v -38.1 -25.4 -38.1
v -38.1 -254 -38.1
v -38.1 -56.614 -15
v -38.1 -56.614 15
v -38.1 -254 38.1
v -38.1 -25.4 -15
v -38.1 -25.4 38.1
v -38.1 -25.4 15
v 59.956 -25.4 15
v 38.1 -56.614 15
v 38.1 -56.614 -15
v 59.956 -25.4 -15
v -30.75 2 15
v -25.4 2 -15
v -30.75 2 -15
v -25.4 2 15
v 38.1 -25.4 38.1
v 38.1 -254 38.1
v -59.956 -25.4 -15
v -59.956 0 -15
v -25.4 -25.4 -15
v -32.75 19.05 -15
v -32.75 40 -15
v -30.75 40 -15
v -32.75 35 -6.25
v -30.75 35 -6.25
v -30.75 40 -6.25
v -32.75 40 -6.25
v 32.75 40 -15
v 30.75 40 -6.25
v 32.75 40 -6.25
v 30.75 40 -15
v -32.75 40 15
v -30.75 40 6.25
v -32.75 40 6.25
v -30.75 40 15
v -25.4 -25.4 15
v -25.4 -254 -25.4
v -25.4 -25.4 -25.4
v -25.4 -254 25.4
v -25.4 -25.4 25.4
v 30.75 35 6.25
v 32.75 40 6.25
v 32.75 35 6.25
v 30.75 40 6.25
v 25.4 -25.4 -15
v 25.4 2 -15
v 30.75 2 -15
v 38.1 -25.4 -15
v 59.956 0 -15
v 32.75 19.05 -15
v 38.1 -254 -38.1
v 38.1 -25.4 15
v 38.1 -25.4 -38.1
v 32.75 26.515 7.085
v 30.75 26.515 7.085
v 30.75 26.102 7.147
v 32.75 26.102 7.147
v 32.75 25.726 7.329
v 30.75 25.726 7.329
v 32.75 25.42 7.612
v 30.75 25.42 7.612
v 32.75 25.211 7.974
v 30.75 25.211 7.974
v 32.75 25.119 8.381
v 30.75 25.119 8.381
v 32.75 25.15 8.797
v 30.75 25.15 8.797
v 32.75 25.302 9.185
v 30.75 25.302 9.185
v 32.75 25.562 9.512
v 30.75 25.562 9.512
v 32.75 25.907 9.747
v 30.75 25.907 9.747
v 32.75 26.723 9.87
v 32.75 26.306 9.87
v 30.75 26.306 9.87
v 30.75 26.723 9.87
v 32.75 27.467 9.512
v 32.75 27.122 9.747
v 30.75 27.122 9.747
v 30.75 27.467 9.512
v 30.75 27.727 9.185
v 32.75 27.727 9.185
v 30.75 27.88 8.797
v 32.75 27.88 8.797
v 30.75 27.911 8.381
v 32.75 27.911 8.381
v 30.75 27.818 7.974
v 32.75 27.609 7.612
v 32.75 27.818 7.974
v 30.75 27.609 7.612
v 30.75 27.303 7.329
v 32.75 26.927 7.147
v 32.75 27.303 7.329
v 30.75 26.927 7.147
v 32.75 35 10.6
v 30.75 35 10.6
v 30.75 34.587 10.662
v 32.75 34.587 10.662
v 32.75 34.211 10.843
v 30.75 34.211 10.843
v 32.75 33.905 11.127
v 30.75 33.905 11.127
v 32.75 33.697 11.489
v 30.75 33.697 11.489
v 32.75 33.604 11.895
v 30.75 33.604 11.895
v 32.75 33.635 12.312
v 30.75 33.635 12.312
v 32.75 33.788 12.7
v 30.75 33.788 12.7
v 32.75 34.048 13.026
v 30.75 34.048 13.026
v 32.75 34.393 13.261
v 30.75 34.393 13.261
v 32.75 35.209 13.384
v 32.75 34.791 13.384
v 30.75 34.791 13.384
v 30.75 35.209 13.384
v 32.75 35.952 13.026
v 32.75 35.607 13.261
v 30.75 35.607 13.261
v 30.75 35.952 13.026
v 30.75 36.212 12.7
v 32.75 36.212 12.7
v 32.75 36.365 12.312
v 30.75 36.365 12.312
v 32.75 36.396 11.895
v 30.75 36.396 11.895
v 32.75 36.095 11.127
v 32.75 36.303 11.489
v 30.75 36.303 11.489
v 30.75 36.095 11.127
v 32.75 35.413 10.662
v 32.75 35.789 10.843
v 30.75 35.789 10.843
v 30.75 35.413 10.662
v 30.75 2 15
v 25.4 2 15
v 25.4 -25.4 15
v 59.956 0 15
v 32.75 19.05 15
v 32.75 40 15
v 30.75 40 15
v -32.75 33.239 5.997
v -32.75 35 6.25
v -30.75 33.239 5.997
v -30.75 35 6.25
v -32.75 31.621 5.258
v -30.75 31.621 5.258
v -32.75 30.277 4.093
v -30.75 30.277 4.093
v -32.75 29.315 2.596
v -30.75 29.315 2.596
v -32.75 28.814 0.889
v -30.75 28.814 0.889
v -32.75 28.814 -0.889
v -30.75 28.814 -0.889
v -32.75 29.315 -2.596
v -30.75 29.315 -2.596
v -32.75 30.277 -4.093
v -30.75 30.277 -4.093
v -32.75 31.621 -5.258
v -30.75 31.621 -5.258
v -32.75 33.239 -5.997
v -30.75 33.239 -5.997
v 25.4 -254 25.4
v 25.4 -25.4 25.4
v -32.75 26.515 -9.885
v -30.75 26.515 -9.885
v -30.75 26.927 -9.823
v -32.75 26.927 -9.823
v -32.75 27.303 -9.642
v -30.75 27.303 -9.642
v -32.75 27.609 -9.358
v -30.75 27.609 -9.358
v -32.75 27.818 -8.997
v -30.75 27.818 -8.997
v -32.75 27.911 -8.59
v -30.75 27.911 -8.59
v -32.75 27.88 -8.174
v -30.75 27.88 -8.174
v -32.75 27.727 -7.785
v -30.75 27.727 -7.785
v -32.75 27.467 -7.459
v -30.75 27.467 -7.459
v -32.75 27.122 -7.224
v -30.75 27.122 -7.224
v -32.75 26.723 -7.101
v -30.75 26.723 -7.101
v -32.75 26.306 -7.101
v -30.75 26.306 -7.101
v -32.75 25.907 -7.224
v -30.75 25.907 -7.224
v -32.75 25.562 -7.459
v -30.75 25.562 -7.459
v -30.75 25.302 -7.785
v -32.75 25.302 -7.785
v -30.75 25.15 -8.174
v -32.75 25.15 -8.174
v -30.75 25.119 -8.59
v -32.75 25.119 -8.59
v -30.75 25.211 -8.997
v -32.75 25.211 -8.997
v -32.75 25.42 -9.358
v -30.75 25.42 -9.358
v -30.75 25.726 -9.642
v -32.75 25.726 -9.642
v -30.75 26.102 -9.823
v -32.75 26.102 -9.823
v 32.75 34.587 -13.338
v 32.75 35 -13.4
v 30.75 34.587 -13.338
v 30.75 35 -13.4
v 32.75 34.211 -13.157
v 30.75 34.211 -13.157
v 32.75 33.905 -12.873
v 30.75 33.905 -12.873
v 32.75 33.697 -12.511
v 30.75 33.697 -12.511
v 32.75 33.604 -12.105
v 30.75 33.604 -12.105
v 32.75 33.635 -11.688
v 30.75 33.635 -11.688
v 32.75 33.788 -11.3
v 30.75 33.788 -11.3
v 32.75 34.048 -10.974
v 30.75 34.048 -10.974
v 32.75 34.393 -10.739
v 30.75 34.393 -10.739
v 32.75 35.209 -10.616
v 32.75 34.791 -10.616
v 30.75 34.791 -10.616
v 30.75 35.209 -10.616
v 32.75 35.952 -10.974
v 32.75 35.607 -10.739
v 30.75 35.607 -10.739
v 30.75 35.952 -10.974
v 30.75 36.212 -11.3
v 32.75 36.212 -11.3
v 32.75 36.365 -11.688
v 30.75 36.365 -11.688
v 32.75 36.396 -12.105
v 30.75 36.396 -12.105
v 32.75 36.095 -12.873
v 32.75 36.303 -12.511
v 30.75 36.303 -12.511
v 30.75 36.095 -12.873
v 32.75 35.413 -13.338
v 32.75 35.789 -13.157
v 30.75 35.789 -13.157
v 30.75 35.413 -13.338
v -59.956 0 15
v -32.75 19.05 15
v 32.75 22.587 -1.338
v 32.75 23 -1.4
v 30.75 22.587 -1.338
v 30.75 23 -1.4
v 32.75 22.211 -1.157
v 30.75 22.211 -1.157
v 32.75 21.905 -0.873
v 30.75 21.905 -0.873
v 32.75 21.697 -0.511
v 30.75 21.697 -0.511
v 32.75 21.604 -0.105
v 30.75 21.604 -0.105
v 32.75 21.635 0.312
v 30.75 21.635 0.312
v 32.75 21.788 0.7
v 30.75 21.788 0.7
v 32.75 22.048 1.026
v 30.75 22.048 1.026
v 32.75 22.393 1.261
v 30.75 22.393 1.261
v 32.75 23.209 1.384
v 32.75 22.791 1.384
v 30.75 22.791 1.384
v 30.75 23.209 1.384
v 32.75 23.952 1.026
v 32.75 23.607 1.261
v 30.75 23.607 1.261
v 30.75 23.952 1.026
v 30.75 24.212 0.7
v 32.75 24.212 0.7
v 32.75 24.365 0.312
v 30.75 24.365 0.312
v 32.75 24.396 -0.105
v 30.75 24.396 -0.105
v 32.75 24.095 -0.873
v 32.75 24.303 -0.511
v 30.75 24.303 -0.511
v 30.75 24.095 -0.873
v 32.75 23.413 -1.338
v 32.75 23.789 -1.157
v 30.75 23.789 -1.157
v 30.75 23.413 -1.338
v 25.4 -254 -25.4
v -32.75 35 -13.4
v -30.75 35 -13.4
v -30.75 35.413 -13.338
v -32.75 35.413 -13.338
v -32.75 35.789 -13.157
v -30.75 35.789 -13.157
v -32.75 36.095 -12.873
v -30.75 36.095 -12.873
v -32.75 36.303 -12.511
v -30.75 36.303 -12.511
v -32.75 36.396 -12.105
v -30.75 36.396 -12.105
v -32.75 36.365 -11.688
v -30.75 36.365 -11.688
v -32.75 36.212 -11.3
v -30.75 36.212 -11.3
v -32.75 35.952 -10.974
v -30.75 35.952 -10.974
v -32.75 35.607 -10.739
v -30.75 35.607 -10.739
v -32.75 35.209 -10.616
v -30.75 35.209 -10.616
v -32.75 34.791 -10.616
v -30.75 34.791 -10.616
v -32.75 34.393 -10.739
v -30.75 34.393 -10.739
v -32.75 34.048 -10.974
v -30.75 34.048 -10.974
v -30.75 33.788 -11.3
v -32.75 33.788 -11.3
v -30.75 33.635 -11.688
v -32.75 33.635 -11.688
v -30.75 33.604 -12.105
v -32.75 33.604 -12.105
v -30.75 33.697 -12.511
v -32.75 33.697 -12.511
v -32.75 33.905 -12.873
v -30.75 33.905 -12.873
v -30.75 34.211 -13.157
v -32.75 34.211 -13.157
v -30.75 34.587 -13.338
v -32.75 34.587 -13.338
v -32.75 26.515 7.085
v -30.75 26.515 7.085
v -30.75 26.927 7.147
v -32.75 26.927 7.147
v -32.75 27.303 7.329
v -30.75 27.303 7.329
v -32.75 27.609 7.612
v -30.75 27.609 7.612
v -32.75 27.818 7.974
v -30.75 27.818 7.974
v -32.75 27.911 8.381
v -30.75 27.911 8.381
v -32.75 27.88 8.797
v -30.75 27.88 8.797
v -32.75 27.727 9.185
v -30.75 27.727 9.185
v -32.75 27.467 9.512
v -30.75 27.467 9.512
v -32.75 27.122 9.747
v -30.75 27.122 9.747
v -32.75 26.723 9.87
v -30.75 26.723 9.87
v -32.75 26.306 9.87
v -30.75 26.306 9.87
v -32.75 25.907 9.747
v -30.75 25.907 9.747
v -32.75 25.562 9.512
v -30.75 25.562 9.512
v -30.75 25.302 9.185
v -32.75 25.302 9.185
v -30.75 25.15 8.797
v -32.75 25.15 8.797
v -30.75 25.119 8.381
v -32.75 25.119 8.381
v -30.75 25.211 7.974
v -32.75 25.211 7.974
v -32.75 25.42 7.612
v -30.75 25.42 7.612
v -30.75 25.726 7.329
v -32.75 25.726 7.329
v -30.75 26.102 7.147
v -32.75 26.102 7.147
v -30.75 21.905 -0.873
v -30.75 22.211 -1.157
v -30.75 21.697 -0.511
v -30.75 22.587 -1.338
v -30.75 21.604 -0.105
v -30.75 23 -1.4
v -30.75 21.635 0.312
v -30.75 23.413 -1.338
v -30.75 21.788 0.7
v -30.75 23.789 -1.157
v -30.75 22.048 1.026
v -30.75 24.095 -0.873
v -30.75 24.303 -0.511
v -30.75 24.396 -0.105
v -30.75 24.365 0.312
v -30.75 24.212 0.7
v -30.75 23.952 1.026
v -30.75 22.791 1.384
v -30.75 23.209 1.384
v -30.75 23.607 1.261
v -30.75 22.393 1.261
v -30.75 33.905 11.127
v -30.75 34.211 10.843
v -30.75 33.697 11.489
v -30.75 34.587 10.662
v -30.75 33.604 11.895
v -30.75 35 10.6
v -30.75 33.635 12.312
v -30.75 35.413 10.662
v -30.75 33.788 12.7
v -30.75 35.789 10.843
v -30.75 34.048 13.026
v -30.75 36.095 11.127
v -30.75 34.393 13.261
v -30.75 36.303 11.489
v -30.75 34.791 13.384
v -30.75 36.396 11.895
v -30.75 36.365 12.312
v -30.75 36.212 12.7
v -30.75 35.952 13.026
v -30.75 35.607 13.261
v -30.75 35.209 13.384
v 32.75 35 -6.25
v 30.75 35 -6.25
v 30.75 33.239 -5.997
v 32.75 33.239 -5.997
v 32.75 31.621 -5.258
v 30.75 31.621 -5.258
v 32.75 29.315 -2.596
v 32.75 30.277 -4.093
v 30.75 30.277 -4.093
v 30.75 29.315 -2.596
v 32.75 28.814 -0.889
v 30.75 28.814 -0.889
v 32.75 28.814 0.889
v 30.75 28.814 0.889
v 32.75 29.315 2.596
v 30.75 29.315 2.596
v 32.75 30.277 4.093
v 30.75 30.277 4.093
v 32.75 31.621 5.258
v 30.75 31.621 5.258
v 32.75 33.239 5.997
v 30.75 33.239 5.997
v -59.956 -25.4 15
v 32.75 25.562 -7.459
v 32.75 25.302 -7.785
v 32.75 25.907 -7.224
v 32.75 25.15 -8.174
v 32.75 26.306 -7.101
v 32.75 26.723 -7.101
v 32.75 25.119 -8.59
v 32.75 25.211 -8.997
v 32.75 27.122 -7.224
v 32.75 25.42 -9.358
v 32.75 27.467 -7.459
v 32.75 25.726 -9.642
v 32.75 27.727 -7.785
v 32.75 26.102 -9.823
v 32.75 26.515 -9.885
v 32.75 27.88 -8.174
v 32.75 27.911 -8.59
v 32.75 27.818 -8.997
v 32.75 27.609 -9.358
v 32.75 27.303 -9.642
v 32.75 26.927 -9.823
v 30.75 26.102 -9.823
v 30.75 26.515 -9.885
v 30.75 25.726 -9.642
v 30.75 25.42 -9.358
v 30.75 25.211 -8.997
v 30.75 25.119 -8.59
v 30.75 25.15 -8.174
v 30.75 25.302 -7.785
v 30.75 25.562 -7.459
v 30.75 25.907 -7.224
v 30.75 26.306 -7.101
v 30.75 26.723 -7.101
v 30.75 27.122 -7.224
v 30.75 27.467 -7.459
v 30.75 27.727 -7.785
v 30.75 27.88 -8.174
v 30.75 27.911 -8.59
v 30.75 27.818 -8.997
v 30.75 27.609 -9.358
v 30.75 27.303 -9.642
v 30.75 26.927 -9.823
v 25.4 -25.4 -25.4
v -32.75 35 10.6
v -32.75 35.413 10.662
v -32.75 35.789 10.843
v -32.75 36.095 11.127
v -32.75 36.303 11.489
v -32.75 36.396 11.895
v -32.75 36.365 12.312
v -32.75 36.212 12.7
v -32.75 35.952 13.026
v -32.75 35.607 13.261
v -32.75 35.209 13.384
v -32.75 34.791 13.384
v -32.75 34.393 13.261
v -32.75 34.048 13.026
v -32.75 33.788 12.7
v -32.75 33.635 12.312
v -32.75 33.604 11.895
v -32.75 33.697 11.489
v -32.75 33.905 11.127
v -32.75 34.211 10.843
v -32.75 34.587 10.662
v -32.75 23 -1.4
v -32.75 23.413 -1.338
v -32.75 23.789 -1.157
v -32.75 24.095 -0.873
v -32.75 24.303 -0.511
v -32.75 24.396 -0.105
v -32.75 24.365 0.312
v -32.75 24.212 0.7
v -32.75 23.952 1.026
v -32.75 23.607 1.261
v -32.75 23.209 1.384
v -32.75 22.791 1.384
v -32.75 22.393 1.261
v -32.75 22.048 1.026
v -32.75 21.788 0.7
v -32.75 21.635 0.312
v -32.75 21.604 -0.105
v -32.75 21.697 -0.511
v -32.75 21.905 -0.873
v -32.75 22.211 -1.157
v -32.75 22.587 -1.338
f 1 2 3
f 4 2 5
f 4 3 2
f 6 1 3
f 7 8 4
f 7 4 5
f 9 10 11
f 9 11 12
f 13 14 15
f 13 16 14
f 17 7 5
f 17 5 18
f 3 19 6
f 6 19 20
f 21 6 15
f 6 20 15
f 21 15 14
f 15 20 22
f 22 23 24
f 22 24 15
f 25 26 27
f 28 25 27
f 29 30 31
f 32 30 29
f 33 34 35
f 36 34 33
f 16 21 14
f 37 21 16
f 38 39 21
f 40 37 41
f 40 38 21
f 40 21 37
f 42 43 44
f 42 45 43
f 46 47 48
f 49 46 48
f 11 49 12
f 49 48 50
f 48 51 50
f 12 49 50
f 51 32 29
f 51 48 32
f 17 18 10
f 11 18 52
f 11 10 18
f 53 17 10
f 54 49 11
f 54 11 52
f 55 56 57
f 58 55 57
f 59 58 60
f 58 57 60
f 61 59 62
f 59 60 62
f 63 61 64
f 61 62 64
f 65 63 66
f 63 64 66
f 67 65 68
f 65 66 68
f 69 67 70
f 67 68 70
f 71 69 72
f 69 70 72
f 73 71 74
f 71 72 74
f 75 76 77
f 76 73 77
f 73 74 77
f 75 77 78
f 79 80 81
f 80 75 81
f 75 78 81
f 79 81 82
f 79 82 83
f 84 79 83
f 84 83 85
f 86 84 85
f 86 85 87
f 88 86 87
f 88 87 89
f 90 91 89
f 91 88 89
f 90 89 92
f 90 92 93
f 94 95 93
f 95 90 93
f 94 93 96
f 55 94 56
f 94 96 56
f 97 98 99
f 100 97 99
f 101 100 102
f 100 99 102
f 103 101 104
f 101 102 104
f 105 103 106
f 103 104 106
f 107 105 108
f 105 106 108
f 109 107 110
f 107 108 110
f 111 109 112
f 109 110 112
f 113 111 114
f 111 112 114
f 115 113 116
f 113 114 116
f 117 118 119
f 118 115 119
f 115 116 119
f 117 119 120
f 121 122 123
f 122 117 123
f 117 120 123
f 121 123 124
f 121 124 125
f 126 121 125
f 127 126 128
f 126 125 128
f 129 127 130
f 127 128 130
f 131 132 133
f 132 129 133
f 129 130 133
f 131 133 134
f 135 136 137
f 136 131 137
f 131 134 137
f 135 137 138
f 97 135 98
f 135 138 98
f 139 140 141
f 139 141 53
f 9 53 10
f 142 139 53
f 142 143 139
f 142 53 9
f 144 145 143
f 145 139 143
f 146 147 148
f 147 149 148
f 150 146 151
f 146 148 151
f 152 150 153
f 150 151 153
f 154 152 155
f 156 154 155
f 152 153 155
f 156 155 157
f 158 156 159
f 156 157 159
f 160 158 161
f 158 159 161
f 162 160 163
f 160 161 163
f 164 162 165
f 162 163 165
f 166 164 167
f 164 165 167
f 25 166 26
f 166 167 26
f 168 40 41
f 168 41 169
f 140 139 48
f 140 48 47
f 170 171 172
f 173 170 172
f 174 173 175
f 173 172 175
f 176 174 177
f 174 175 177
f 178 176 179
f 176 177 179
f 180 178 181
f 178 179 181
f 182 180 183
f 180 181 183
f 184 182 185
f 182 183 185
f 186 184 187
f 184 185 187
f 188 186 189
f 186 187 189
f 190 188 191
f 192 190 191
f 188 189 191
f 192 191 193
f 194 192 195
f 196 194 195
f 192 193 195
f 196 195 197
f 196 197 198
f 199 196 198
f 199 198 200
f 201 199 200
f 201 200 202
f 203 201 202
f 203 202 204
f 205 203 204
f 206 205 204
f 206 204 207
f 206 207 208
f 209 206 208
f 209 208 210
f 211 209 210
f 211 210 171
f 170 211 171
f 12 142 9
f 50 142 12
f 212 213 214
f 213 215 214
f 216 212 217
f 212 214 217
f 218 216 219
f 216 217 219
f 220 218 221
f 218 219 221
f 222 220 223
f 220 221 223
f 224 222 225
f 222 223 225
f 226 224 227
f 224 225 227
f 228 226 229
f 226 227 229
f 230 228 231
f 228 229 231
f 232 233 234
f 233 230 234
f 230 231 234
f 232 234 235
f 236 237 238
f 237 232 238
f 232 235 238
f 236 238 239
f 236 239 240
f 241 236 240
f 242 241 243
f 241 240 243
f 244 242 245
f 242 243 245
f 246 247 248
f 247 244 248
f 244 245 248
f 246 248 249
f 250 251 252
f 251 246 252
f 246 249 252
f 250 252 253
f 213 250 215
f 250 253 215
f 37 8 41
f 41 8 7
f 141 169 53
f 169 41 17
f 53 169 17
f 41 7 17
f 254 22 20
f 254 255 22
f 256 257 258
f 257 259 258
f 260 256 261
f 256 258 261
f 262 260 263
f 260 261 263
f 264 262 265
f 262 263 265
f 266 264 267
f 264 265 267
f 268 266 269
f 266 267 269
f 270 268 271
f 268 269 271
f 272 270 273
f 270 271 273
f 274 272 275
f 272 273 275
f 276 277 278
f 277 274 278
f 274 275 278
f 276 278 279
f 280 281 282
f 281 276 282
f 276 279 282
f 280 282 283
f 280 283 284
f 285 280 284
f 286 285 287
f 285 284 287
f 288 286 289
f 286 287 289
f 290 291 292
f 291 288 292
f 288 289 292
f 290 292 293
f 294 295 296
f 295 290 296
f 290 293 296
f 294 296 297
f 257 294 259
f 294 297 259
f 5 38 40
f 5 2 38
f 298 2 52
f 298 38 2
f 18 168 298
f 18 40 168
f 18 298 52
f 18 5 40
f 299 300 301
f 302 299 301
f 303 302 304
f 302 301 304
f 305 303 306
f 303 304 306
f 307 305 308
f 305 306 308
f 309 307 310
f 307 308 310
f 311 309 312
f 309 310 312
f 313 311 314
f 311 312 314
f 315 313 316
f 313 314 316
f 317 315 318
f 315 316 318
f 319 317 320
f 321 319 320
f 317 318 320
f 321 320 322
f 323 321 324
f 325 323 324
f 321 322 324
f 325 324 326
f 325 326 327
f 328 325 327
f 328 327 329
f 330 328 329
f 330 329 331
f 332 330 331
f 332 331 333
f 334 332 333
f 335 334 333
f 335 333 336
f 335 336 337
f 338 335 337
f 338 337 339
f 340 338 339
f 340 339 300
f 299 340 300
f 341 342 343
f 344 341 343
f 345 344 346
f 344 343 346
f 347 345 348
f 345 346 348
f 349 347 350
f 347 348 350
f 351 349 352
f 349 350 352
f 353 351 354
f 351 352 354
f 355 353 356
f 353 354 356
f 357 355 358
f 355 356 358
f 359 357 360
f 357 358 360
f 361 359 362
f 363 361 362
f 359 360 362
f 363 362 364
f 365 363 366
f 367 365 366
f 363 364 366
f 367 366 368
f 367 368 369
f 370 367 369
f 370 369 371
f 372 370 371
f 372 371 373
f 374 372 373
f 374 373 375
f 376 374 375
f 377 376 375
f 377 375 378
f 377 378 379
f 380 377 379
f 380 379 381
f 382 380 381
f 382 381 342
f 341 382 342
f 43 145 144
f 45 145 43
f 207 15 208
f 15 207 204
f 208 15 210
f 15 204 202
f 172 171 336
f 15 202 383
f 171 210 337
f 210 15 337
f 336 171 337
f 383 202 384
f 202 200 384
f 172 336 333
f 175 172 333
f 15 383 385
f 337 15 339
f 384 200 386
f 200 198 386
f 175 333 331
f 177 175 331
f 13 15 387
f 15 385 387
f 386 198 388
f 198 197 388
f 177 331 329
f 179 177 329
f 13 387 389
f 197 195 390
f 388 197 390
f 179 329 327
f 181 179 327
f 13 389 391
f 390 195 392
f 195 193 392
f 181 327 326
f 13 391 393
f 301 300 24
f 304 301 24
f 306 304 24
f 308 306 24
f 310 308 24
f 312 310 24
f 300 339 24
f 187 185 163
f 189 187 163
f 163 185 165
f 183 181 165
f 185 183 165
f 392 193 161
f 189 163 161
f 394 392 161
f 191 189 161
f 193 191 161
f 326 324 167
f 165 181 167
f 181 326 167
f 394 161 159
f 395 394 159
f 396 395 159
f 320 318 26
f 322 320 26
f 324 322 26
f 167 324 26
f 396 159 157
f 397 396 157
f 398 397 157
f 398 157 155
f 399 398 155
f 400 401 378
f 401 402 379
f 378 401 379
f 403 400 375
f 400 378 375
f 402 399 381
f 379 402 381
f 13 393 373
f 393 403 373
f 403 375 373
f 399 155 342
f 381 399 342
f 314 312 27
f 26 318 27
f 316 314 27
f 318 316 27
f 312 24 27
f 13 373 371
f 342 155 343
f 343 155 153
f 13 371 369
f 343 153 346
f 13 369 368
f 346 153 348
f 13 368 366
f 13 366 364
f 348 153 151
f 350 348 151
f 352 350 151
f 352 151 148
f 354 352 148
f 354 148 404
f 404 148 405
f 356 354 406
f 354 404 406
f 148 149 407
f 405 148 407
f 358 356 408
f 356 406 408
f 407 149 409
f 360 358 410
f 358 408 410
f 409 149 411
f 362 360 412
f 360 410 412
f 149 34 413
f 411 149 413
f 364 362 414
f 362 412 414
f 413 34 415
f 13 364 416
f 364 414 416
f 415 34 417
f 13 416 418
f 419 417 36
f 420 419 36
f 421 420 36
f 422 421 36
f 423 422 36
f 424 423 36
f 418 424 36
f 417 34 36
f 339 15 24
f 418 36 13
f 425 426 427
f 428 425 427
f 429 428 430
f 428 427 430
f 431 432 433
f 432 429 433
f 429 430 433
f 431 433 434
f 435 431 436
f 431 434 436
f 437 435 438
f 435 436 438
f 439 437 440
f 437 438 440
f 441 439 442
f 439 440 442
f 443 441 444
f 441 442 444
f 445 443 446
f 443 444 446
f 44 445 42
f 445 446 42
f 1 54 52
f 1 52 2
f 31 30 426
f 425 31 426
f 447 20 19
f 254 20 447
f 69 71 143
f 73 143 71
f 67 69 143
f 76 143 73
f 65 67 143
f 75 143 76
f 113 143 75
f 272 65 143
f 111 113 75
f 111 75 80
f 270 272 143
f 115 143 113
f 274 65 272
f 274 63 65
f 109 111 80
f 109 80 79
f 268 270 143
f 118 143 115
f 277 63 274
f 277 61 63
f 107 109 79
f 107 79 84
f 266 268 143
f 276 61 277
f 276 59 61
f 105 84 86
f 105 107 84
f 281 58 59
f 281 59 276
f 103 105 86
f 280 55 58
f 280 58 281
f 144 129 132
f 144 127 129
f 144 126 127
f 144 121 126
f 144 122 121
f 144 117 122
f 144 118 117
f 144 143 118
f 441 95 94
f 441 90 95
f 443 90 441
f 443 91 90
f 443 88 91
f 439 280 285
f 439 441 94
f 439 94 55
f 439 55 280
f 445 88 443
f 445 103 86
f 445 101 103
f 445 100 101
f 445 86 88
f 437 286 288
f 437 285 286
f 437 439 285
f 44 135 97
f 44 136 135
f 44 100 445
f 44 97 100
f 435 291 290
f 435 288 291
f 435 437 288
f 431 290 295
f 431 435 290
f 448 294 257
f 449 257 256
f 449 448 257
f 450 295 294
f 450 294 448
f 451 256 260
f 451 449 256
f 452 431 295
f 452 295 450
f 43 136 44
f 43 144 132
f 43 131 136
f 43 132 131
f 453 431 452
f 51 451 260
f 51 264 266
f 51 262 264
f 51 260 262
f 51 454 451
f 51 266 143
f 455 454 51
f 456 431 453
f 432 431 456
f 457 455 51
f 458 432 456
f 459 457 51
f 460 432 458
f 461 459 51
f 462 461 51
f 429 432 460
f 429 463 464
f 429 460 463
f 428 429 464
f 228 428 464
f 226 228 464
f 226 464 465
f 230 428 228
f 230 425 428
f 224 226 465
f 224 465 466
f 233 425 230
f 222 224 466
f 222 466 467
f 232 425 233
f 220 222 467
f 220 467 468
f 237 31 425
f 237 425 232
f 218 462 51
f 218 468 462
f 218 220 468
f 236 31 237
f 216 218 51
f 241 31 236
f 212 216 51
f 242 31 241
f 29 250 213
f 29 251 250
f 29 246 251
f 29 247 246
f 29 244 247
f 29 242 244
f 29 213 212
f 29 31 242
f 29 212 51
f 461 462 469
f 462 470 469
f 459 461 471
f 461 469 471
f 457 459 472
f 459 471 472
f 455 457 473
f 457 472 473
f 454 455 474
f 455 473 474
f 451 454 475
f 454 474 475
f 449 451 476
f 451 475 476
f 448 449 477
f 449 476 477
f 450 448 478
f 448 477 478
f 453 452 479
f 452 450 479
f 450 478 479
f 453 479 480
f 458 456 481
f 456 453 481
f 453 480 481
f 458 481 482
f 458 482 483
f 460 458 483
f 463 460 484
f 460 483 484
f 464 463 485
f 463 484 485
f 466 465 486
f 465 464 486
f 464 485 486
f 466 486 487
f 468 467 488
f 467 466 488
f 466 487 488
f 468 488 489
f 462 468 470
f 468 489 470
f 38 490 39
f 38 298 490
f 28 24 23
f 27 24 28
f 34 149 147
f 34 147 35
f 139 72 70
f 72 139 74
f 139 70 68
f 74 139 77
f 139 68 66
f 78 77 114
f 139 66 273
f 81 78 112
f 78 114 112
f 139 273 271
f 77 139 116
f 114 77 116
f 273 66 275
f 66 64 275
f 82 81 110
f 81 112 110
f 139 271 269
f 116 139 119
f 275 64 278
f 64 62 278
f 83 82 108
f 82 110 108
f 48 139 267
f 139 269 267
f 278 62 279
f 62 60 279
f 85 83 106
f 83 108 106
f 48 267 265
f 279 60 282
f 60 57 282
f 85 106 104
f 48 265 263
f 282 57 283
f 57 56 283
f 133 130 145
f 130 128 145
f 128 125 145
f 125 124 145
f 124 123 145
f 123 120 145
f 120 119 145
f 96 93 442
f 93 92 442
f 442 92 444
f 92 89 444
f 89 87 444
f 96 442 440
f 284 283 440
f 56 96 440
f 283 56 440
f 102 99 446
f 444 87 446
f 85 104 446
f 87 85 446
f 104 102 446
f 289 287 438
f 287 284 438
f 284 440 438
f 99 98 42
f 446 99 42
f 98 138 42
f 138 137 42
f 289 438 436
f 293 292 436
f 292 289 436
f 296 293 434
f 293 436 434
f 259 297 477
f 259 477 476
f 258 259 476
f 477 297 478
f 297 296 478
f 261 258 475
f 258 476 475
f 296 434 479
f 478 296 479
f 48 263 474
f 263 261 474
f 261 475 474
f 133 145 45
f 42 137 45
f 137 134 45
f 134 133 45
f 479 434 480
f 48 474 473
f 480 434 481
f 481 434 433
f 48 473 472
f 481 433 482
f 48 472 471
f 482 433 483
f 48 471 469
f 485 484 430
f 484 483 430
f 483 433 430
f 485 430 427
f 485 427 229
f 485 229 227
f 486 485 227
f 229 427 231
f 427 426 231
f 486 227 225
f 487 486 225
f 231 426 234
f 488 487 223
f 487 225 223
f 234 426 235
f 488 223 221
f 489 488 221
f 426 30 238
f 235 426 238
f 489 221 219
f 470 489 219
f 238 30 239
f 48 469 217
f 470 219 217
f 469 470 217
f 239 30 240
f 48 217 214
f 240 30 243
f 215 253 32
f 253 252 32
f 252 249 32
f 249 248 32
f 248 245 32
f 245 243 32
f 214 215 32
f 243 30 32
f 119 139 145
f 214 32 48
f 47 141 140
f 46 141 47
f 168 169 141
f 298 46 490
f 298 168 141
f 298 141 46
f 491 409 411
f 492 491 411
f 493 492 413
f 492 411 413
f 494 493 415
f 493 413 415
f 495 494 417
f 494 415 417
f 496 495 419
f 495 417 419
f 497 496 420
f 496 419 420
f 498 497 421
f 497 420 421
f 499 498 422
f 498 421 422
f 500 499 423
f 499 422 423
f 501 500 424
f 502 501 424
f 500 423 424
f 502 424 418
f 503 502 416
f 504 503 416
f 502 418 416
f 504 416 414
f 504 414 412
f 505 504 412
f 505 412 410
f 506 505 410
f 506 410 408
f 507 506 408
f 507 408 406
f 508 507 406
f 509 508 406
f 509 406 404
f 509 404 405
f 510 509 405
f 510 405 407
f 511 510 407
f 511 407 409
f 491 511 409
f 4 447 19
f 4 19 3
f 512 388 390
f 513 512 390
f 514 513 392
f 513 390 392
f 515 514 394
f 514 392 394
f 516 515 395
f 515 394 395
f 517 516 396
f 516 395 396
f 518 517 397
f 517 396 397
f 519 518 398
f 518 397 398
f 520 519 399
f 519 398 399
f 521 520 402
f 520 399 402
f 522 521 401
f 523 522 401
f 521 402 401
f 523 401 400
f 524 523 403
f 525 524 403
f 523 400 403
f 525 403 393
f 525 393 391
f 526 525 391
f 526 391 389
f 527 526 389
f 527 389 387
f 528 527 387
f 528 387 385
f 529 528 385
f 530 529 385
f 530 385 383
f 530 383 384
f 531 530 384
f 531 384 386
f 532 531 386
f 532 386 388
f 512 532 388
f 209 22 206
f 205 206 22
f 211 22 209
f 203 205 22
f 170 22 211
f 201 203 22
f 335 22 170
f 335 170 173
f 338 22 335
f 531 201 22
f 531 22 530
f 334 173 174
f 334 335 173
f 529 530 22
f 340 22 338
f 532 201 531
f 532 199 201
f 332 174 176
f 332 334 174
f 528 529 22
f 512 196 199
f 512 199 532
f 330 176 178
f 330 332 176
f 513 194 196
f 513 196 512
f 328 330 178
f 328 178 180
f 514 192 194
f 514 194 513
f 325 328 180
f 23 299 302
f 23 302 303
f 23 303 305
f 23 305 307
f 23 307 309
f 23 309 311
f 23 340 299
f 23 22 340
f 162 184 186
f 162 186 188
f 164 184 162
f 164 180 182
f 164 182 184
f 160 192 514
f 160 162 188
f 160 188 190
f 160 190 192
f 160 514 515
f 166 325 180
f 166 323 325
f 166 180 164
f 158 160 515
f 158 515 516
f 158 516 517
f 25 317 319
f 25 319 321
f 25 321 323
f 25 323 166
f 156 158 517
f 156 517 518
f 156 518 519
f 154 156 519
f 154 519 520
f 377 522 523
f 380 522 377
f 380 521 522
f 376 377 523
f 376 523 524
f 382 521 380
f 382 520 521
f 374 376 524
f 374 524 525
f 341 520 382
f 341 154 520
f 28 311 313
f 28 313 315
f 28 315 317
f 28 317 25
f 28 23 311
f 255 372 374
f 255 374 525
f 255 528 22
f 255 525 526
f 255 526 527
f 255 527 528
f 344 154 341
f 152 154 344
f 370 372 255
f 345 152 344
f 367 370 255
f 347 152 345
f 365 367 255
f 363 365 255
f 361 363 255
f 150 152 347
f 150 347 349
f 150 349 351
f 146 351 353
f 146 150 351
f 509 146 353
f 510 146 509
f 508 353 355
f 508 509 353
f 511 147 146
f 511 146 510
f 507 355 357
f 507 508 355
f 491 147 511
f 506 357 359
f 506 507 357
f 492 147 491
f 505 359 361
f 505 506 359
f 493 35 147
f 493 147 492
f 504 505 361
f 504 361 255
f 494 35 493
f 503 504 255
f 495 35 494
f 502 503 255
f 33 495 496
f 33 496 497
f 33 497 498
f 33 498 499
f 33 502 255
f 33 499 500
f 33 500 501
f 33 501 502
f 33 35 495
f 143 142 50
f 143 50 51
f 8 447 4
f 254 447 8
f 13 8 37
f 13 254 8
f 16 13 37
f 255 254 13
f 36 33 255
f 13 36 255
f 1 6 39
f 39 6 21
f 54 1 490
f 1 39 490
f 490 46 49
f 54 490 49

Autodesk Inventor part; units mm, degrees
ref_plane "XZ Plane" through (0, 0, 0) normal (0, 1, 0) x (-1, 0, 0)
ref_plane "XY Plane" through (0, 0, 0) normal (0, 0, 1) x (1, 0, 0)
sketch "Sketch1" plane through (0, 0, 0) normal (0, 1, 0) x (-1, 0, 0)
  line L0 (30.75, -15) -> (-30.75, -15)
  line L1 (-30.75, -15) -> (-30.75, 15)
  line L2 (-30.75, 15) -> (30.75, 15)
  line L3 (30.75, 15) -> (30.75, -15)
  point P0 (0, 0)
  point P1 (-30.75, 0)
  point P2 (0, -15)
  dimension "d0" = 61.5
  dimension "d1" = 30
extrude "Extrusion1" add sketch "Sketch1" along normal blind 2
sketch "Sketch2" plane through (30.75, 0, 15) normal (1, 0, 0) x (0, 0, -1)
  line L0 (0, 0) -> (30, 0) construction
  line L1 (0, 2) -> (30, 2) construction
  line L2 (0, 0) -> (0, 40)
  line L3 (30, 0) -> (30, 40)
  line L4 (0, 0) -> (30, 0)
  circle A0 centre (15, 35) radius 12 construction
  arc A1 (8.75, 35) -> (21.25, 35) centre (15, 35) ccw
  line L5 (8.75, 40) -> (8.75, 35)
  line L6 (21.25, 40) -> (21.25, 35)
  line L7 (0, 40) -> (8.75, 40)
  line L8 (21.25, 40) -> (30, 40)
  circle A2 centre (3, 35) radius 1.4
  circle A3 centre (6.5147, 26.5147) radius 1.4
  circle A4 centre (15, 23) radius 1.4
  circle A5 centre (23.4853, 26.5147) radius 1.4
  circle A6 centre (27, 35) radius 1.4
  point P0 (15, 0)
  point P1 (15, 2)
  point P2 (15, 28.75)
  dimension "d5" = 24
  dimension "d4" = 40
  dimension "d6" = 35
  dimension "d7" = 12.5
  dimension "d9" = 2.8
  dimension "d12" = 180
extrude "Extrusion2" add sketch "Sketch2" along normal blind 2
mirror "Mirror1" about plane through (0, 0, 0) normal (1, 0, 0) of "Extrusion2"
sketch "Sketch3" plane through (30.75, 2, 15) normal (0, 0, 1) x (1, 0, 0)
  line L0 (-63.5, 38) -> (-63.5, -2) construction
  line L1 (-63.5, 17.05) -> (-90.7062, -2)
  line L2 (-63.5, 17.05) -> (-63.5, -2)
  line L3 (-63.5, -2) -> (-90.7062, -2)
  point P0 (-30.75, -2)
  dimension "d16" = 19.05
  dimension "d17" = 55
extrude "Extrusion3" add sketch "Sketch3" against normal blind 30
mirror "Mirror2" about plane through (0, 0, 0) normal (1, 0, 0) of "Extrusion3"
sketch "Sketch4" plane through (0, 0, 0) normal (0, -1, 0) x (1, 0, 0)
  line L0 (-59.9562, 15) -> (59.9562, 15)
  line L1 (59.9562, 15) -> (59.9562, -15)
  line L2 (59.9562, -15) -> (-59.9562, -15)
  line L3 (-59.9562, -15) -> (-59.9562, 15)
  point P0 (0, 0)
extrude "Extrusion4" add sketch "Sketch4" along normal blind 25.4
sketch "Sketch5" plane through (0, -25.4, 0) normal (0, -1, 0) x (1, 0, 0)
  line L0 (-38.1, 38.1) -> (38.1, 38.1)
  line L1 (38.1, 38.1) -> (38.1, -38.1)
  line L2 (38.1, -38.1) -> (-38.1, -38.1)
  line L3 (-38.1, -38.1) -> (-38.1, 38.1)
  point P0 (0, 0)
  point P1 (0, 38.1)
  point P2 (38.1, 0)
  dimension "d22" = 76.2
  dimension "d23" = 76.2
extrude "Extrusion5" add sketch "Sketch5" along normal blind 228.6
sketch "Sketch6" plane through (30.75, 2, 15) normal (0, 0, 1) x (1, 0, 0)
  line L0 (-90.7062, -27.4) -> (-68.85, -58.6139)
  line L1 (-68.85, -27.4) -> (-68.85, -256) construction
  line L2 (-90.7062, -27.4) -> (-52.6011, -27.4) construction
  line L3 (-90.7062, -27.4) -> (-68.85, -27.4)
  line L4 (-68.85, -58.6139) -> (-68.85, -27.4)
  point P0 (-30.75, -2)
  dimension "d26" = 55
extrude "Extrusion6" add sketch "Sketch6" against normal blind 30
mirror "Mirror3" about plane through (0, 0, 0) normal (1, 0, 0) of "Extrusion6"
sketch "Sketch7" plane through (0, -254, 0) normal (0, -1, 0) x (1, 0, 0)
  line L0 (38.1, -38.1) -> (38.1, 38.1) construction
  line L1 (38.1, 38.1) -> (-38.1, 38.1) construction
  line L2 (25.4, -25.4) -> (-25.4, -25.4)
  line L3 (-25.4, -25.4) -> (-25.4, 25.4)
  line L4 (-25.4, 25.4) -> (25.4, 25.4)
  line L5 (25.4, 25.4) -> (25.4, -25.4)
  point P0 (0, 0)
  point P1 (0, 25.4)
  point P2 (0, 38.1)
  point P3 (25.4, 0)
  point P4 (38.1, 0)
  dimension "d29" = 50.8
  dimension "d30" = 50.8
extrude "Extrusion7" cut sketch "Sketch7" against normal blind 260.1875
properties part number "BiggerBracket"
